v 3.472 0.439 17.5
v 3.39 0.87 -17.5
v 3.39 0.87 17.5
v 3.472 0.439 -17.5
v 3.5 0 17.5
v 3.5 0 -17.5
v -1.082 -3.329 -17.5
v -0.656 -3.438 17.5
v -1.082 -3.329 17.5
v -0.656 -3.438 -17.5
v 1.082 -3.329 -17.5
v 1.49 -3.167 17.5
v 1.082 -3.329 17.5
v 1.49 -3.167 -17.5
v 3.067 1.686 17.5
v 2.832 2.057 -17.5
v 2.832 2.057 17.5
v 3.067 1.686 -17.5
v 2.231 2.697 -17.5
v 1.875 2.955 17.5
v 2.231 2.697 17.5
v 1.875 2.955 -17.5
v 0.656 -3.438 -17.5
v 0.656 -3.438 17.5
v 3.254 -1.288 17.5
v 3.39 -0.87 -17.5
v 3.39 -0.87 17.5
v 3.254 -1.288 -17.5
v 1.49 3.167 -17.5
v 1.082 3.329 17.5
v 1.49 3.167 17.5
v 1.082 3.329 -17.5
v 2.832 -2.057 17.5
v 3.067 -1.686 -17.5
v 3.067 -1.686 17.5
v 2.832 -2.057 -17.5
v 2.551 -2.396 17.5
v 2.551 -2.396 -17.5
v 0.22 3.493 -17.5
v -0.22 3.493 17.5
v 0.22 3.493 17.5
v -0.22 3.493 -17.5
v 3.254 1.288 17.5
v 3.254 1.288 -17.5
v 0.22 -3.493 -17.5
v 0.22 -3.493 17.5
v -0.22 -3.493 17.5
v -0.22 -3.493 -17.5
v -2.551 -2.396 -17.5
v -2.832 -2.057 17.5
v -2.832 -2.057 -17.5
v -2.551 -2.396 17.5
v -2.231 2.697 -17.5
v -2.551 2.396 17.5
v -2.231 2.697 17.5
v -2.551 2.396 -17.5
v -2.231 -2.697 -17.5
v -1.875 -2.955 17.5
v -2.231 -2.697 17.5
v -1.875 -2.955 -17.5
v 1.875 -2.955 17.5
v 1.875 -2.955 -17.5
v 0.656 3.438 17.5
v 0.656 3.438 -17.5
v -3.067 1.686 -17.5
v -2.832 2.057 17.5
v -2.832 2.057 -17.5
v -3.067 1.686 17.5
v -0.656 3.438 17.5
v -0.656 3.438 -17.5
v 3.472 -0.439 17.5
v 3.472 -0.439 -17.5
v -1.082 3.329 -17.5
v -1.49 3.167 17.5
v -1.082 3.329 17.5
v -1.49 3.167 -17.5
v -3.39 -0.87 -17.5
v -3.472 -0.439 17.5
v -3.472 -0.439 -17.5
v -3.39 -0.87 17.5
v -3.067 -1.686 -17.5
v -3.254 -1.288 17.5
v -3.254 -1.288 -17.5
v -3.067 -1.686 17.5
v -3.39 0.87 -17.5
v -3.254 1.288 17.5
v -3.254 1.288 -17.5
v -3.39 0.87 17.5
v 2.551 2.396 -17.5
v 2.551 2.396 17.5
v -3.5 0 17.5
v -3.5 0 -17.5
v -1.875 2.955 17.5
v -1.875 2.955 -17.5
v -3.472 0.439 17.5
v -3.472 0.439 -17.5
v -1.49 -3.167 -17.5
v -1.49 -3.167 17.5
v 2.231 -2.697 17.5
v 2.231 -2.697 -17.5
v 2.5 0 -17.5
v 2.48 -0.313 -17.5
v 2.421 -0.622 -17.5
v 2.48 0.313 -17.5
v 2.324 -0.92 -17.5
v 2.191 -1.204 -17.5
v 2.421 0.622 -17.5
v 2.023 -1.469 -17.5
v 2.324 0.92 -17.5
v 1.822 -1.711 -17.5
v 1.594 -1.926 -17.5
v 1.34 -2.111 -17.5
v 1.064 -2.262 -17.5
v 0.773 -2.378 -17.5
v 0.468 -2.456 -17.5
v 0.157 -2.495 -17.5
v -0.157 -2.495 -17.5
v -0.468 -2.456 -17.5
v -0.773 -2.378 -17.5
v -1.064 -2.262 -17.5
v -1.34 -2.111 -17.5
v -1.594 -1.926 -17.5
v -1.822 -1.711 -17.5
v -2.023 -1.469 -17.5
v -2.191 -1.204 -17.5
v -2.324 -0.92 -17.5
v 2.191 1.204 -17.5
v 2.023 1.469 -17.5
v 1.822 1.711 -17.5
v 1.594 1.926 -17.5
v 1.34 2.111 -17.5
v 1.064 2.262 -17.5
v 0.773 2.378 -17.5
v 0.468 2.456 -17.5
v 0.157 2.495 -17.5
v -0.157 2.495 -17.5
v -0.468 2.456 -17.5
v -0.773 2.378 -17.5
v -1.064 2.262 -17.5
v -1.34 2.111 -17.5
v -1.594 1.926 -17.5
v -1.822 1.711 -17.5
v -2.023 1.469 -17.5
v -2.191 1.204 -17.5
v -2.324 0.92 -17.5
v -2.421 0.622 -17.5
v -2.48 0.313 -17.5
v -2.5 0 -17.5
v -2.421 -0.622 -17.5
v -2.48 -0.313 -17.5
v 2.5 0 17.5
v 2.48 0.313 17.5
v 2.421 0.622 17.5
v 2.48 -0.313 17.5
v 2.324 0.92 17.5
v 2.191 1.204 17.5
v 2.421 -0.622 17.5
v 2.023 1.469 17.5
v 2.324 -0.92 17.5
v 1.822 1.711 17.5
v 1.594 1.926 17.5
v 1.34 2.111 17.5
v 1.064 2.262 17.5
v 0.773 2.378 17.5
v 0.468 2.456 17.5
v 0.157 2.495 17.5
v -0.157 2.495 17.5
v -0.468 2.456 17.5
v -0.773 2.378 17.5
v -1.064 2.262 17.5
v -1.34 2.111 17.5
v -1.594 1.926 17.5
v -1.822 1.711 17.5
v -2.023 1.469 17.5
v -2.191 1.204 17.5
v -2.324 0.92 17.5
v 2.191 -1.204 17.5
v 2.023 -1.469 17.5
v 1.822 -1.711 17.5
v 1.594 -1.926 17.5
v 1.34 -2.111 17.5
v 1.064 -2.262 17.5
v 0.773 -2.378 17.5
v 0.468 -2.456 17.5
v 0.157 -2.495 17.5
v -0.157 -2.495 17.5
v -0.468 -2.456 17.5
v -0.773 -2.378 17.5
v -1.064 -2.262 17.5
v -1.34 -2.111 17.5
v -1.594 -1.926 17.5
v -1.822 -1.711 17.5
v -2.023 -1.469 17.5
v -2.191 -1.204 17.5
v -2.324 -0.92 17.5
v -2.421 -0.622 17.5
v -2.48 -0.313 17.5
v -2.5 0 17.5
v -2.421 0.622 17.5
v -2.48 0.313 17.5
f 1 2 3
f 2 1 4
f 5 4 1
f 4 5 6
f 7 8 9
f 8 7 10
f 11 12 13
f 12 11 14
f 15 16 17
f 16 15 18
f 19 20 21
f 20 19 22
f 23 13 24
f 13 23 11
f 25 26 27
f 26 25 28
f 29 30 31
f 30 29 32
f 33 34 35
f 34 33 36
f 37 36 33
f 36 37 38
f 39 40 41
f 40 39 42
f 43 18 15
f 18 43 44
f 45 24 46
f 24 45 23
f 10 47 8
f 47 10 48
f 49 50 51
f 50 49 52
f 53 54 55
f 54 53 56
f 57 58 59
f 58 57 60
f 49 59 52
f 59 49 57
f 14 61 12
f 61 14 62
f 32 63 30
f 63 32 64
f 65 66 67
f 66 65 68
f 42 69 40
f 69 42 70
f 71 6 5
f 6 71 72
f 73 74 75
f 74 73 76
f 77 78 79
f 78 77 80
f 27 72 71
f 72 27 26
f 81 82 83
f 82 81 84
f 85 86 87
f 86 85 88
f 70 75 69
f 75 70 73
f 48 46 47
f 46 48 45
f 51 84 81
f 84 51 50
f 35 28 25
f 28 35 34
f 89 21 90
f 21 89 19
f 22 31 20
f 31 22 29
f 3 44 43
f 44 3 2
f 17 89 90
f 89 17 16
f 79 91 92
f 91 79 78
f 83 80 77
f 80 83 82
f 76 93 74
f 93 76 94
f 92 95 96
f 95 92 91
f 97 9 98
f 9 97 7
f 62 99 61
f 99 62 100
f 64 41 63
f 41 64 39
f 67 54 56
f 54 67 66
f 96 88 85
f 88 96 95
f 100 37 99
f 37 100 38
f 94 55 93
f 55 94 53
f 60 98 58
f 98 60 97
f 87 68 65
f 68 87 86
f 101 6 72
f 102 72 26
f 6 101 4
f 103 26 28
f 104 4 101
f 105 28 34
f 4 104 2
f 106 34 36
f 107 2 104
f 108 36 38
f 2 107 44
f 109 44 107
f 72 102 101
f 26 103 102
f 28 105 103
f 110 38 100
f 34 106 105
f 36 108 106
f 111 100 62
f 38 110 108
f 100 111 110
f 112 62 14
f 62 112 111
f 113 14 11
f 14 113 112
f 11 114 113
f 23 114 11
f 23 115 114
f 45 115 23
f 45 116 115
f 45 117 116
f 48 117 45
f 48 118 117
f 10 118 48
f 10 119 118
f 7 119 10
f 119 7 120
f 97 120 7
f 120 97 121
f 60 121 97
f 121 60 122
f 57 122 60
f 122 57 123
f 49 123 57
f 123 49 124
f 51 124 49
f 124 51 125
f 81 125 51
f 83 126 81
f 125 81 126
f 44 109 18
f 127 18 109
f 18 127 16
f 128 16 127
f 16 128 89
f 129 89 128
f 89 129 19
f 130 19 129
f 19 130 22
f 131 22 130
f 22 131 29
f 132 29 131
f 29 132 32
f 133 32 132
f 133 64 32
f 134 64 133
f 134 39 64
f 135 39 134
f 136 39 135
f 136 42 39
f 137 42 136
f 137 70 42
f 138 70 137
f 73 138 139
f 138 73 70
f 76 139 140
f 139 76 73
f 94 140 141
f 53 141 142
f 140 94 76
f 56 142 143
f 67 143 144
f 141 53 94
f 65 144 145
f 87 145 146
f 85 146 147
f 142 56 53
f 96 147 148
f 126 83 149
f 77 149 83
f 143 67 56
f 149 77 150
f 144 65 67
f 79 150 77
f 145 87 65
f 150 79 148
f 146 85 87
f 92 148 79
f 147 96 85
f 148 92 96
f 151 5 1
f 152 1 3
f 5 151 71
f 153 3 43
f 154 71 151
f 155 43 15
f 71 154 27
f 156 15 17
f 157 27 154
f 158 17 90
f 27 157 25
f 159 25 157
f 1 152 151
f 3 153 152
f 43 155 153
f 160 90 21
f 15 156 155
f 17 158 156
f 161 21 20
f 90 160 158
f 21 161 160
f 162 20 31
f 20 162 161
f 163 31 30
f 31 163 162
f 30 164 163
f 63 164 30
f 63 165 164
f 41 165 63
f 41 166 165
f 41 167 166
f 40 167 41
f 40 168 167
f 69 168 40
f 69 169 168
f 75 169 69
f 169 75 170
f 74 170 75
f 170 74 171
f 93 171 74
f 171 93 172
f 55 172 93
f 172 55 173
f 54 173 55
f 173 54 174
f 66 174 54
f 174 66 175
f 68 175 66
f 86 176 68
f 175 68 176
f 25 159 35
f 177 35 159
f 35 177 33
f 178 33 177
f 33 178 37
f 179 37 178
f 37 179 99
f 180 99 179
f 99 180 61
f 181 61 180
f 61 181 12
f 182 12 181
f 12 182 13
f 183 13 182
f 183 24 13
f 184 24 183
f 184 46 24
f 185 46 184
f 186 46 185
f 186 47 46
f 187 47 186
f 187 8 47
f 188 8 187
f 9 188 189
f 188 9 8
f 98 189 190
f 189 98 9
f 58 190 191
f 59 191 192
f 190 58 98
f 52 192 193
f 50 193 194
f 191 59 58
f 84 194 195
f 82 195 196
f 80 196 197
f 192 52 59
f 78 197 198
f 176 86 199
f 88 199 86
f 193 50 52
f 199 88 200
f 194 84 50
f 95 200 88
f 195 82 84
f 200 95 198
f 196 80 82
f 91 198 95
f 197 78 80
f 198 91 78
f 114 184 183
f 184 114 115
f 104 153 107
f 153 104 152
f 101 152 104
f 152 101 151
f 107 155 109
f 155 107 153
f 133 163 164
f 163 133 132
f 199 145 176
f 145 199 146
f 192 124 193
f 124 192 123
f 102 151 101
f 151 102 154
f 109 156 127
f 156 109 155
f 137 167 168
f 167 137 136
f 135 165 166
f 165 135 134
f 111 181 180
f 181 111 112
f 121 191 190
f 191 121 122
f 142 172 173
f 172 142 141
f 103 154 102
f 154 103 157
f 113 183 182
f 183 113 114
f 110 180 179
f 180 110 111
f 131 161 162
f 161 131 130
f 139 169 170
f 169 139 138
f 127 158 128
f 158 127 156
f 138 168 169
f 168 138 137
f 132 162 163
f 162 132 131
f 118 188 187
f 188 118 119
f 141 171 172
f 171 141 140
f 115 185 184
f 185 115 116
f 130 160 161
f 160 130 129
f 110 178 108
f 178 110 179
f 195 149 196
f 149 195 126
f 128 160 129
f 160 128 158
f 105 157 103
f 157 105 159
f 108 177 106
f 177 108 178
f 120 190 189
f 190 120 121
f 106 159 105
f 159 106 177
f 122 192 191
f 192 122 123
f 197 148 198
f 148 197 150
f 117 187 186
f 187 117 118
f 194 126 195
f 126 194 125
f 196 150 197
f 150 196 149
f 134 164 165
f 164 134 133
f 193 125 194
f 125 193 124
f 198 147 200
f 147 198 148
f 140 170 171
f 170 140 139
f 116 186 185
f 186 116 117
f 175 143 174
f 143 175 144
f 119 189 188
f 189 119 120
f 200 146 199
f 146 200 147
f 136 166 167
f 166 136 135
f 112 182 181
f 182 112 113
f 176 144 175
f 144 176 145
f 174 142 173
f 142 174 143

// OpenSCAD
$fn = 50;


difference() {
	union() {
		translate(v = [0, 0, -17.5000000000]) {
			cylinder(h = 35, r = 3.5000000000);
		}
	}
	union() {
		translate(v = [0, 0, -100.0000000000]) {
			cylinder(h = 200, r = 2.5000000000);
		}
	}
}
